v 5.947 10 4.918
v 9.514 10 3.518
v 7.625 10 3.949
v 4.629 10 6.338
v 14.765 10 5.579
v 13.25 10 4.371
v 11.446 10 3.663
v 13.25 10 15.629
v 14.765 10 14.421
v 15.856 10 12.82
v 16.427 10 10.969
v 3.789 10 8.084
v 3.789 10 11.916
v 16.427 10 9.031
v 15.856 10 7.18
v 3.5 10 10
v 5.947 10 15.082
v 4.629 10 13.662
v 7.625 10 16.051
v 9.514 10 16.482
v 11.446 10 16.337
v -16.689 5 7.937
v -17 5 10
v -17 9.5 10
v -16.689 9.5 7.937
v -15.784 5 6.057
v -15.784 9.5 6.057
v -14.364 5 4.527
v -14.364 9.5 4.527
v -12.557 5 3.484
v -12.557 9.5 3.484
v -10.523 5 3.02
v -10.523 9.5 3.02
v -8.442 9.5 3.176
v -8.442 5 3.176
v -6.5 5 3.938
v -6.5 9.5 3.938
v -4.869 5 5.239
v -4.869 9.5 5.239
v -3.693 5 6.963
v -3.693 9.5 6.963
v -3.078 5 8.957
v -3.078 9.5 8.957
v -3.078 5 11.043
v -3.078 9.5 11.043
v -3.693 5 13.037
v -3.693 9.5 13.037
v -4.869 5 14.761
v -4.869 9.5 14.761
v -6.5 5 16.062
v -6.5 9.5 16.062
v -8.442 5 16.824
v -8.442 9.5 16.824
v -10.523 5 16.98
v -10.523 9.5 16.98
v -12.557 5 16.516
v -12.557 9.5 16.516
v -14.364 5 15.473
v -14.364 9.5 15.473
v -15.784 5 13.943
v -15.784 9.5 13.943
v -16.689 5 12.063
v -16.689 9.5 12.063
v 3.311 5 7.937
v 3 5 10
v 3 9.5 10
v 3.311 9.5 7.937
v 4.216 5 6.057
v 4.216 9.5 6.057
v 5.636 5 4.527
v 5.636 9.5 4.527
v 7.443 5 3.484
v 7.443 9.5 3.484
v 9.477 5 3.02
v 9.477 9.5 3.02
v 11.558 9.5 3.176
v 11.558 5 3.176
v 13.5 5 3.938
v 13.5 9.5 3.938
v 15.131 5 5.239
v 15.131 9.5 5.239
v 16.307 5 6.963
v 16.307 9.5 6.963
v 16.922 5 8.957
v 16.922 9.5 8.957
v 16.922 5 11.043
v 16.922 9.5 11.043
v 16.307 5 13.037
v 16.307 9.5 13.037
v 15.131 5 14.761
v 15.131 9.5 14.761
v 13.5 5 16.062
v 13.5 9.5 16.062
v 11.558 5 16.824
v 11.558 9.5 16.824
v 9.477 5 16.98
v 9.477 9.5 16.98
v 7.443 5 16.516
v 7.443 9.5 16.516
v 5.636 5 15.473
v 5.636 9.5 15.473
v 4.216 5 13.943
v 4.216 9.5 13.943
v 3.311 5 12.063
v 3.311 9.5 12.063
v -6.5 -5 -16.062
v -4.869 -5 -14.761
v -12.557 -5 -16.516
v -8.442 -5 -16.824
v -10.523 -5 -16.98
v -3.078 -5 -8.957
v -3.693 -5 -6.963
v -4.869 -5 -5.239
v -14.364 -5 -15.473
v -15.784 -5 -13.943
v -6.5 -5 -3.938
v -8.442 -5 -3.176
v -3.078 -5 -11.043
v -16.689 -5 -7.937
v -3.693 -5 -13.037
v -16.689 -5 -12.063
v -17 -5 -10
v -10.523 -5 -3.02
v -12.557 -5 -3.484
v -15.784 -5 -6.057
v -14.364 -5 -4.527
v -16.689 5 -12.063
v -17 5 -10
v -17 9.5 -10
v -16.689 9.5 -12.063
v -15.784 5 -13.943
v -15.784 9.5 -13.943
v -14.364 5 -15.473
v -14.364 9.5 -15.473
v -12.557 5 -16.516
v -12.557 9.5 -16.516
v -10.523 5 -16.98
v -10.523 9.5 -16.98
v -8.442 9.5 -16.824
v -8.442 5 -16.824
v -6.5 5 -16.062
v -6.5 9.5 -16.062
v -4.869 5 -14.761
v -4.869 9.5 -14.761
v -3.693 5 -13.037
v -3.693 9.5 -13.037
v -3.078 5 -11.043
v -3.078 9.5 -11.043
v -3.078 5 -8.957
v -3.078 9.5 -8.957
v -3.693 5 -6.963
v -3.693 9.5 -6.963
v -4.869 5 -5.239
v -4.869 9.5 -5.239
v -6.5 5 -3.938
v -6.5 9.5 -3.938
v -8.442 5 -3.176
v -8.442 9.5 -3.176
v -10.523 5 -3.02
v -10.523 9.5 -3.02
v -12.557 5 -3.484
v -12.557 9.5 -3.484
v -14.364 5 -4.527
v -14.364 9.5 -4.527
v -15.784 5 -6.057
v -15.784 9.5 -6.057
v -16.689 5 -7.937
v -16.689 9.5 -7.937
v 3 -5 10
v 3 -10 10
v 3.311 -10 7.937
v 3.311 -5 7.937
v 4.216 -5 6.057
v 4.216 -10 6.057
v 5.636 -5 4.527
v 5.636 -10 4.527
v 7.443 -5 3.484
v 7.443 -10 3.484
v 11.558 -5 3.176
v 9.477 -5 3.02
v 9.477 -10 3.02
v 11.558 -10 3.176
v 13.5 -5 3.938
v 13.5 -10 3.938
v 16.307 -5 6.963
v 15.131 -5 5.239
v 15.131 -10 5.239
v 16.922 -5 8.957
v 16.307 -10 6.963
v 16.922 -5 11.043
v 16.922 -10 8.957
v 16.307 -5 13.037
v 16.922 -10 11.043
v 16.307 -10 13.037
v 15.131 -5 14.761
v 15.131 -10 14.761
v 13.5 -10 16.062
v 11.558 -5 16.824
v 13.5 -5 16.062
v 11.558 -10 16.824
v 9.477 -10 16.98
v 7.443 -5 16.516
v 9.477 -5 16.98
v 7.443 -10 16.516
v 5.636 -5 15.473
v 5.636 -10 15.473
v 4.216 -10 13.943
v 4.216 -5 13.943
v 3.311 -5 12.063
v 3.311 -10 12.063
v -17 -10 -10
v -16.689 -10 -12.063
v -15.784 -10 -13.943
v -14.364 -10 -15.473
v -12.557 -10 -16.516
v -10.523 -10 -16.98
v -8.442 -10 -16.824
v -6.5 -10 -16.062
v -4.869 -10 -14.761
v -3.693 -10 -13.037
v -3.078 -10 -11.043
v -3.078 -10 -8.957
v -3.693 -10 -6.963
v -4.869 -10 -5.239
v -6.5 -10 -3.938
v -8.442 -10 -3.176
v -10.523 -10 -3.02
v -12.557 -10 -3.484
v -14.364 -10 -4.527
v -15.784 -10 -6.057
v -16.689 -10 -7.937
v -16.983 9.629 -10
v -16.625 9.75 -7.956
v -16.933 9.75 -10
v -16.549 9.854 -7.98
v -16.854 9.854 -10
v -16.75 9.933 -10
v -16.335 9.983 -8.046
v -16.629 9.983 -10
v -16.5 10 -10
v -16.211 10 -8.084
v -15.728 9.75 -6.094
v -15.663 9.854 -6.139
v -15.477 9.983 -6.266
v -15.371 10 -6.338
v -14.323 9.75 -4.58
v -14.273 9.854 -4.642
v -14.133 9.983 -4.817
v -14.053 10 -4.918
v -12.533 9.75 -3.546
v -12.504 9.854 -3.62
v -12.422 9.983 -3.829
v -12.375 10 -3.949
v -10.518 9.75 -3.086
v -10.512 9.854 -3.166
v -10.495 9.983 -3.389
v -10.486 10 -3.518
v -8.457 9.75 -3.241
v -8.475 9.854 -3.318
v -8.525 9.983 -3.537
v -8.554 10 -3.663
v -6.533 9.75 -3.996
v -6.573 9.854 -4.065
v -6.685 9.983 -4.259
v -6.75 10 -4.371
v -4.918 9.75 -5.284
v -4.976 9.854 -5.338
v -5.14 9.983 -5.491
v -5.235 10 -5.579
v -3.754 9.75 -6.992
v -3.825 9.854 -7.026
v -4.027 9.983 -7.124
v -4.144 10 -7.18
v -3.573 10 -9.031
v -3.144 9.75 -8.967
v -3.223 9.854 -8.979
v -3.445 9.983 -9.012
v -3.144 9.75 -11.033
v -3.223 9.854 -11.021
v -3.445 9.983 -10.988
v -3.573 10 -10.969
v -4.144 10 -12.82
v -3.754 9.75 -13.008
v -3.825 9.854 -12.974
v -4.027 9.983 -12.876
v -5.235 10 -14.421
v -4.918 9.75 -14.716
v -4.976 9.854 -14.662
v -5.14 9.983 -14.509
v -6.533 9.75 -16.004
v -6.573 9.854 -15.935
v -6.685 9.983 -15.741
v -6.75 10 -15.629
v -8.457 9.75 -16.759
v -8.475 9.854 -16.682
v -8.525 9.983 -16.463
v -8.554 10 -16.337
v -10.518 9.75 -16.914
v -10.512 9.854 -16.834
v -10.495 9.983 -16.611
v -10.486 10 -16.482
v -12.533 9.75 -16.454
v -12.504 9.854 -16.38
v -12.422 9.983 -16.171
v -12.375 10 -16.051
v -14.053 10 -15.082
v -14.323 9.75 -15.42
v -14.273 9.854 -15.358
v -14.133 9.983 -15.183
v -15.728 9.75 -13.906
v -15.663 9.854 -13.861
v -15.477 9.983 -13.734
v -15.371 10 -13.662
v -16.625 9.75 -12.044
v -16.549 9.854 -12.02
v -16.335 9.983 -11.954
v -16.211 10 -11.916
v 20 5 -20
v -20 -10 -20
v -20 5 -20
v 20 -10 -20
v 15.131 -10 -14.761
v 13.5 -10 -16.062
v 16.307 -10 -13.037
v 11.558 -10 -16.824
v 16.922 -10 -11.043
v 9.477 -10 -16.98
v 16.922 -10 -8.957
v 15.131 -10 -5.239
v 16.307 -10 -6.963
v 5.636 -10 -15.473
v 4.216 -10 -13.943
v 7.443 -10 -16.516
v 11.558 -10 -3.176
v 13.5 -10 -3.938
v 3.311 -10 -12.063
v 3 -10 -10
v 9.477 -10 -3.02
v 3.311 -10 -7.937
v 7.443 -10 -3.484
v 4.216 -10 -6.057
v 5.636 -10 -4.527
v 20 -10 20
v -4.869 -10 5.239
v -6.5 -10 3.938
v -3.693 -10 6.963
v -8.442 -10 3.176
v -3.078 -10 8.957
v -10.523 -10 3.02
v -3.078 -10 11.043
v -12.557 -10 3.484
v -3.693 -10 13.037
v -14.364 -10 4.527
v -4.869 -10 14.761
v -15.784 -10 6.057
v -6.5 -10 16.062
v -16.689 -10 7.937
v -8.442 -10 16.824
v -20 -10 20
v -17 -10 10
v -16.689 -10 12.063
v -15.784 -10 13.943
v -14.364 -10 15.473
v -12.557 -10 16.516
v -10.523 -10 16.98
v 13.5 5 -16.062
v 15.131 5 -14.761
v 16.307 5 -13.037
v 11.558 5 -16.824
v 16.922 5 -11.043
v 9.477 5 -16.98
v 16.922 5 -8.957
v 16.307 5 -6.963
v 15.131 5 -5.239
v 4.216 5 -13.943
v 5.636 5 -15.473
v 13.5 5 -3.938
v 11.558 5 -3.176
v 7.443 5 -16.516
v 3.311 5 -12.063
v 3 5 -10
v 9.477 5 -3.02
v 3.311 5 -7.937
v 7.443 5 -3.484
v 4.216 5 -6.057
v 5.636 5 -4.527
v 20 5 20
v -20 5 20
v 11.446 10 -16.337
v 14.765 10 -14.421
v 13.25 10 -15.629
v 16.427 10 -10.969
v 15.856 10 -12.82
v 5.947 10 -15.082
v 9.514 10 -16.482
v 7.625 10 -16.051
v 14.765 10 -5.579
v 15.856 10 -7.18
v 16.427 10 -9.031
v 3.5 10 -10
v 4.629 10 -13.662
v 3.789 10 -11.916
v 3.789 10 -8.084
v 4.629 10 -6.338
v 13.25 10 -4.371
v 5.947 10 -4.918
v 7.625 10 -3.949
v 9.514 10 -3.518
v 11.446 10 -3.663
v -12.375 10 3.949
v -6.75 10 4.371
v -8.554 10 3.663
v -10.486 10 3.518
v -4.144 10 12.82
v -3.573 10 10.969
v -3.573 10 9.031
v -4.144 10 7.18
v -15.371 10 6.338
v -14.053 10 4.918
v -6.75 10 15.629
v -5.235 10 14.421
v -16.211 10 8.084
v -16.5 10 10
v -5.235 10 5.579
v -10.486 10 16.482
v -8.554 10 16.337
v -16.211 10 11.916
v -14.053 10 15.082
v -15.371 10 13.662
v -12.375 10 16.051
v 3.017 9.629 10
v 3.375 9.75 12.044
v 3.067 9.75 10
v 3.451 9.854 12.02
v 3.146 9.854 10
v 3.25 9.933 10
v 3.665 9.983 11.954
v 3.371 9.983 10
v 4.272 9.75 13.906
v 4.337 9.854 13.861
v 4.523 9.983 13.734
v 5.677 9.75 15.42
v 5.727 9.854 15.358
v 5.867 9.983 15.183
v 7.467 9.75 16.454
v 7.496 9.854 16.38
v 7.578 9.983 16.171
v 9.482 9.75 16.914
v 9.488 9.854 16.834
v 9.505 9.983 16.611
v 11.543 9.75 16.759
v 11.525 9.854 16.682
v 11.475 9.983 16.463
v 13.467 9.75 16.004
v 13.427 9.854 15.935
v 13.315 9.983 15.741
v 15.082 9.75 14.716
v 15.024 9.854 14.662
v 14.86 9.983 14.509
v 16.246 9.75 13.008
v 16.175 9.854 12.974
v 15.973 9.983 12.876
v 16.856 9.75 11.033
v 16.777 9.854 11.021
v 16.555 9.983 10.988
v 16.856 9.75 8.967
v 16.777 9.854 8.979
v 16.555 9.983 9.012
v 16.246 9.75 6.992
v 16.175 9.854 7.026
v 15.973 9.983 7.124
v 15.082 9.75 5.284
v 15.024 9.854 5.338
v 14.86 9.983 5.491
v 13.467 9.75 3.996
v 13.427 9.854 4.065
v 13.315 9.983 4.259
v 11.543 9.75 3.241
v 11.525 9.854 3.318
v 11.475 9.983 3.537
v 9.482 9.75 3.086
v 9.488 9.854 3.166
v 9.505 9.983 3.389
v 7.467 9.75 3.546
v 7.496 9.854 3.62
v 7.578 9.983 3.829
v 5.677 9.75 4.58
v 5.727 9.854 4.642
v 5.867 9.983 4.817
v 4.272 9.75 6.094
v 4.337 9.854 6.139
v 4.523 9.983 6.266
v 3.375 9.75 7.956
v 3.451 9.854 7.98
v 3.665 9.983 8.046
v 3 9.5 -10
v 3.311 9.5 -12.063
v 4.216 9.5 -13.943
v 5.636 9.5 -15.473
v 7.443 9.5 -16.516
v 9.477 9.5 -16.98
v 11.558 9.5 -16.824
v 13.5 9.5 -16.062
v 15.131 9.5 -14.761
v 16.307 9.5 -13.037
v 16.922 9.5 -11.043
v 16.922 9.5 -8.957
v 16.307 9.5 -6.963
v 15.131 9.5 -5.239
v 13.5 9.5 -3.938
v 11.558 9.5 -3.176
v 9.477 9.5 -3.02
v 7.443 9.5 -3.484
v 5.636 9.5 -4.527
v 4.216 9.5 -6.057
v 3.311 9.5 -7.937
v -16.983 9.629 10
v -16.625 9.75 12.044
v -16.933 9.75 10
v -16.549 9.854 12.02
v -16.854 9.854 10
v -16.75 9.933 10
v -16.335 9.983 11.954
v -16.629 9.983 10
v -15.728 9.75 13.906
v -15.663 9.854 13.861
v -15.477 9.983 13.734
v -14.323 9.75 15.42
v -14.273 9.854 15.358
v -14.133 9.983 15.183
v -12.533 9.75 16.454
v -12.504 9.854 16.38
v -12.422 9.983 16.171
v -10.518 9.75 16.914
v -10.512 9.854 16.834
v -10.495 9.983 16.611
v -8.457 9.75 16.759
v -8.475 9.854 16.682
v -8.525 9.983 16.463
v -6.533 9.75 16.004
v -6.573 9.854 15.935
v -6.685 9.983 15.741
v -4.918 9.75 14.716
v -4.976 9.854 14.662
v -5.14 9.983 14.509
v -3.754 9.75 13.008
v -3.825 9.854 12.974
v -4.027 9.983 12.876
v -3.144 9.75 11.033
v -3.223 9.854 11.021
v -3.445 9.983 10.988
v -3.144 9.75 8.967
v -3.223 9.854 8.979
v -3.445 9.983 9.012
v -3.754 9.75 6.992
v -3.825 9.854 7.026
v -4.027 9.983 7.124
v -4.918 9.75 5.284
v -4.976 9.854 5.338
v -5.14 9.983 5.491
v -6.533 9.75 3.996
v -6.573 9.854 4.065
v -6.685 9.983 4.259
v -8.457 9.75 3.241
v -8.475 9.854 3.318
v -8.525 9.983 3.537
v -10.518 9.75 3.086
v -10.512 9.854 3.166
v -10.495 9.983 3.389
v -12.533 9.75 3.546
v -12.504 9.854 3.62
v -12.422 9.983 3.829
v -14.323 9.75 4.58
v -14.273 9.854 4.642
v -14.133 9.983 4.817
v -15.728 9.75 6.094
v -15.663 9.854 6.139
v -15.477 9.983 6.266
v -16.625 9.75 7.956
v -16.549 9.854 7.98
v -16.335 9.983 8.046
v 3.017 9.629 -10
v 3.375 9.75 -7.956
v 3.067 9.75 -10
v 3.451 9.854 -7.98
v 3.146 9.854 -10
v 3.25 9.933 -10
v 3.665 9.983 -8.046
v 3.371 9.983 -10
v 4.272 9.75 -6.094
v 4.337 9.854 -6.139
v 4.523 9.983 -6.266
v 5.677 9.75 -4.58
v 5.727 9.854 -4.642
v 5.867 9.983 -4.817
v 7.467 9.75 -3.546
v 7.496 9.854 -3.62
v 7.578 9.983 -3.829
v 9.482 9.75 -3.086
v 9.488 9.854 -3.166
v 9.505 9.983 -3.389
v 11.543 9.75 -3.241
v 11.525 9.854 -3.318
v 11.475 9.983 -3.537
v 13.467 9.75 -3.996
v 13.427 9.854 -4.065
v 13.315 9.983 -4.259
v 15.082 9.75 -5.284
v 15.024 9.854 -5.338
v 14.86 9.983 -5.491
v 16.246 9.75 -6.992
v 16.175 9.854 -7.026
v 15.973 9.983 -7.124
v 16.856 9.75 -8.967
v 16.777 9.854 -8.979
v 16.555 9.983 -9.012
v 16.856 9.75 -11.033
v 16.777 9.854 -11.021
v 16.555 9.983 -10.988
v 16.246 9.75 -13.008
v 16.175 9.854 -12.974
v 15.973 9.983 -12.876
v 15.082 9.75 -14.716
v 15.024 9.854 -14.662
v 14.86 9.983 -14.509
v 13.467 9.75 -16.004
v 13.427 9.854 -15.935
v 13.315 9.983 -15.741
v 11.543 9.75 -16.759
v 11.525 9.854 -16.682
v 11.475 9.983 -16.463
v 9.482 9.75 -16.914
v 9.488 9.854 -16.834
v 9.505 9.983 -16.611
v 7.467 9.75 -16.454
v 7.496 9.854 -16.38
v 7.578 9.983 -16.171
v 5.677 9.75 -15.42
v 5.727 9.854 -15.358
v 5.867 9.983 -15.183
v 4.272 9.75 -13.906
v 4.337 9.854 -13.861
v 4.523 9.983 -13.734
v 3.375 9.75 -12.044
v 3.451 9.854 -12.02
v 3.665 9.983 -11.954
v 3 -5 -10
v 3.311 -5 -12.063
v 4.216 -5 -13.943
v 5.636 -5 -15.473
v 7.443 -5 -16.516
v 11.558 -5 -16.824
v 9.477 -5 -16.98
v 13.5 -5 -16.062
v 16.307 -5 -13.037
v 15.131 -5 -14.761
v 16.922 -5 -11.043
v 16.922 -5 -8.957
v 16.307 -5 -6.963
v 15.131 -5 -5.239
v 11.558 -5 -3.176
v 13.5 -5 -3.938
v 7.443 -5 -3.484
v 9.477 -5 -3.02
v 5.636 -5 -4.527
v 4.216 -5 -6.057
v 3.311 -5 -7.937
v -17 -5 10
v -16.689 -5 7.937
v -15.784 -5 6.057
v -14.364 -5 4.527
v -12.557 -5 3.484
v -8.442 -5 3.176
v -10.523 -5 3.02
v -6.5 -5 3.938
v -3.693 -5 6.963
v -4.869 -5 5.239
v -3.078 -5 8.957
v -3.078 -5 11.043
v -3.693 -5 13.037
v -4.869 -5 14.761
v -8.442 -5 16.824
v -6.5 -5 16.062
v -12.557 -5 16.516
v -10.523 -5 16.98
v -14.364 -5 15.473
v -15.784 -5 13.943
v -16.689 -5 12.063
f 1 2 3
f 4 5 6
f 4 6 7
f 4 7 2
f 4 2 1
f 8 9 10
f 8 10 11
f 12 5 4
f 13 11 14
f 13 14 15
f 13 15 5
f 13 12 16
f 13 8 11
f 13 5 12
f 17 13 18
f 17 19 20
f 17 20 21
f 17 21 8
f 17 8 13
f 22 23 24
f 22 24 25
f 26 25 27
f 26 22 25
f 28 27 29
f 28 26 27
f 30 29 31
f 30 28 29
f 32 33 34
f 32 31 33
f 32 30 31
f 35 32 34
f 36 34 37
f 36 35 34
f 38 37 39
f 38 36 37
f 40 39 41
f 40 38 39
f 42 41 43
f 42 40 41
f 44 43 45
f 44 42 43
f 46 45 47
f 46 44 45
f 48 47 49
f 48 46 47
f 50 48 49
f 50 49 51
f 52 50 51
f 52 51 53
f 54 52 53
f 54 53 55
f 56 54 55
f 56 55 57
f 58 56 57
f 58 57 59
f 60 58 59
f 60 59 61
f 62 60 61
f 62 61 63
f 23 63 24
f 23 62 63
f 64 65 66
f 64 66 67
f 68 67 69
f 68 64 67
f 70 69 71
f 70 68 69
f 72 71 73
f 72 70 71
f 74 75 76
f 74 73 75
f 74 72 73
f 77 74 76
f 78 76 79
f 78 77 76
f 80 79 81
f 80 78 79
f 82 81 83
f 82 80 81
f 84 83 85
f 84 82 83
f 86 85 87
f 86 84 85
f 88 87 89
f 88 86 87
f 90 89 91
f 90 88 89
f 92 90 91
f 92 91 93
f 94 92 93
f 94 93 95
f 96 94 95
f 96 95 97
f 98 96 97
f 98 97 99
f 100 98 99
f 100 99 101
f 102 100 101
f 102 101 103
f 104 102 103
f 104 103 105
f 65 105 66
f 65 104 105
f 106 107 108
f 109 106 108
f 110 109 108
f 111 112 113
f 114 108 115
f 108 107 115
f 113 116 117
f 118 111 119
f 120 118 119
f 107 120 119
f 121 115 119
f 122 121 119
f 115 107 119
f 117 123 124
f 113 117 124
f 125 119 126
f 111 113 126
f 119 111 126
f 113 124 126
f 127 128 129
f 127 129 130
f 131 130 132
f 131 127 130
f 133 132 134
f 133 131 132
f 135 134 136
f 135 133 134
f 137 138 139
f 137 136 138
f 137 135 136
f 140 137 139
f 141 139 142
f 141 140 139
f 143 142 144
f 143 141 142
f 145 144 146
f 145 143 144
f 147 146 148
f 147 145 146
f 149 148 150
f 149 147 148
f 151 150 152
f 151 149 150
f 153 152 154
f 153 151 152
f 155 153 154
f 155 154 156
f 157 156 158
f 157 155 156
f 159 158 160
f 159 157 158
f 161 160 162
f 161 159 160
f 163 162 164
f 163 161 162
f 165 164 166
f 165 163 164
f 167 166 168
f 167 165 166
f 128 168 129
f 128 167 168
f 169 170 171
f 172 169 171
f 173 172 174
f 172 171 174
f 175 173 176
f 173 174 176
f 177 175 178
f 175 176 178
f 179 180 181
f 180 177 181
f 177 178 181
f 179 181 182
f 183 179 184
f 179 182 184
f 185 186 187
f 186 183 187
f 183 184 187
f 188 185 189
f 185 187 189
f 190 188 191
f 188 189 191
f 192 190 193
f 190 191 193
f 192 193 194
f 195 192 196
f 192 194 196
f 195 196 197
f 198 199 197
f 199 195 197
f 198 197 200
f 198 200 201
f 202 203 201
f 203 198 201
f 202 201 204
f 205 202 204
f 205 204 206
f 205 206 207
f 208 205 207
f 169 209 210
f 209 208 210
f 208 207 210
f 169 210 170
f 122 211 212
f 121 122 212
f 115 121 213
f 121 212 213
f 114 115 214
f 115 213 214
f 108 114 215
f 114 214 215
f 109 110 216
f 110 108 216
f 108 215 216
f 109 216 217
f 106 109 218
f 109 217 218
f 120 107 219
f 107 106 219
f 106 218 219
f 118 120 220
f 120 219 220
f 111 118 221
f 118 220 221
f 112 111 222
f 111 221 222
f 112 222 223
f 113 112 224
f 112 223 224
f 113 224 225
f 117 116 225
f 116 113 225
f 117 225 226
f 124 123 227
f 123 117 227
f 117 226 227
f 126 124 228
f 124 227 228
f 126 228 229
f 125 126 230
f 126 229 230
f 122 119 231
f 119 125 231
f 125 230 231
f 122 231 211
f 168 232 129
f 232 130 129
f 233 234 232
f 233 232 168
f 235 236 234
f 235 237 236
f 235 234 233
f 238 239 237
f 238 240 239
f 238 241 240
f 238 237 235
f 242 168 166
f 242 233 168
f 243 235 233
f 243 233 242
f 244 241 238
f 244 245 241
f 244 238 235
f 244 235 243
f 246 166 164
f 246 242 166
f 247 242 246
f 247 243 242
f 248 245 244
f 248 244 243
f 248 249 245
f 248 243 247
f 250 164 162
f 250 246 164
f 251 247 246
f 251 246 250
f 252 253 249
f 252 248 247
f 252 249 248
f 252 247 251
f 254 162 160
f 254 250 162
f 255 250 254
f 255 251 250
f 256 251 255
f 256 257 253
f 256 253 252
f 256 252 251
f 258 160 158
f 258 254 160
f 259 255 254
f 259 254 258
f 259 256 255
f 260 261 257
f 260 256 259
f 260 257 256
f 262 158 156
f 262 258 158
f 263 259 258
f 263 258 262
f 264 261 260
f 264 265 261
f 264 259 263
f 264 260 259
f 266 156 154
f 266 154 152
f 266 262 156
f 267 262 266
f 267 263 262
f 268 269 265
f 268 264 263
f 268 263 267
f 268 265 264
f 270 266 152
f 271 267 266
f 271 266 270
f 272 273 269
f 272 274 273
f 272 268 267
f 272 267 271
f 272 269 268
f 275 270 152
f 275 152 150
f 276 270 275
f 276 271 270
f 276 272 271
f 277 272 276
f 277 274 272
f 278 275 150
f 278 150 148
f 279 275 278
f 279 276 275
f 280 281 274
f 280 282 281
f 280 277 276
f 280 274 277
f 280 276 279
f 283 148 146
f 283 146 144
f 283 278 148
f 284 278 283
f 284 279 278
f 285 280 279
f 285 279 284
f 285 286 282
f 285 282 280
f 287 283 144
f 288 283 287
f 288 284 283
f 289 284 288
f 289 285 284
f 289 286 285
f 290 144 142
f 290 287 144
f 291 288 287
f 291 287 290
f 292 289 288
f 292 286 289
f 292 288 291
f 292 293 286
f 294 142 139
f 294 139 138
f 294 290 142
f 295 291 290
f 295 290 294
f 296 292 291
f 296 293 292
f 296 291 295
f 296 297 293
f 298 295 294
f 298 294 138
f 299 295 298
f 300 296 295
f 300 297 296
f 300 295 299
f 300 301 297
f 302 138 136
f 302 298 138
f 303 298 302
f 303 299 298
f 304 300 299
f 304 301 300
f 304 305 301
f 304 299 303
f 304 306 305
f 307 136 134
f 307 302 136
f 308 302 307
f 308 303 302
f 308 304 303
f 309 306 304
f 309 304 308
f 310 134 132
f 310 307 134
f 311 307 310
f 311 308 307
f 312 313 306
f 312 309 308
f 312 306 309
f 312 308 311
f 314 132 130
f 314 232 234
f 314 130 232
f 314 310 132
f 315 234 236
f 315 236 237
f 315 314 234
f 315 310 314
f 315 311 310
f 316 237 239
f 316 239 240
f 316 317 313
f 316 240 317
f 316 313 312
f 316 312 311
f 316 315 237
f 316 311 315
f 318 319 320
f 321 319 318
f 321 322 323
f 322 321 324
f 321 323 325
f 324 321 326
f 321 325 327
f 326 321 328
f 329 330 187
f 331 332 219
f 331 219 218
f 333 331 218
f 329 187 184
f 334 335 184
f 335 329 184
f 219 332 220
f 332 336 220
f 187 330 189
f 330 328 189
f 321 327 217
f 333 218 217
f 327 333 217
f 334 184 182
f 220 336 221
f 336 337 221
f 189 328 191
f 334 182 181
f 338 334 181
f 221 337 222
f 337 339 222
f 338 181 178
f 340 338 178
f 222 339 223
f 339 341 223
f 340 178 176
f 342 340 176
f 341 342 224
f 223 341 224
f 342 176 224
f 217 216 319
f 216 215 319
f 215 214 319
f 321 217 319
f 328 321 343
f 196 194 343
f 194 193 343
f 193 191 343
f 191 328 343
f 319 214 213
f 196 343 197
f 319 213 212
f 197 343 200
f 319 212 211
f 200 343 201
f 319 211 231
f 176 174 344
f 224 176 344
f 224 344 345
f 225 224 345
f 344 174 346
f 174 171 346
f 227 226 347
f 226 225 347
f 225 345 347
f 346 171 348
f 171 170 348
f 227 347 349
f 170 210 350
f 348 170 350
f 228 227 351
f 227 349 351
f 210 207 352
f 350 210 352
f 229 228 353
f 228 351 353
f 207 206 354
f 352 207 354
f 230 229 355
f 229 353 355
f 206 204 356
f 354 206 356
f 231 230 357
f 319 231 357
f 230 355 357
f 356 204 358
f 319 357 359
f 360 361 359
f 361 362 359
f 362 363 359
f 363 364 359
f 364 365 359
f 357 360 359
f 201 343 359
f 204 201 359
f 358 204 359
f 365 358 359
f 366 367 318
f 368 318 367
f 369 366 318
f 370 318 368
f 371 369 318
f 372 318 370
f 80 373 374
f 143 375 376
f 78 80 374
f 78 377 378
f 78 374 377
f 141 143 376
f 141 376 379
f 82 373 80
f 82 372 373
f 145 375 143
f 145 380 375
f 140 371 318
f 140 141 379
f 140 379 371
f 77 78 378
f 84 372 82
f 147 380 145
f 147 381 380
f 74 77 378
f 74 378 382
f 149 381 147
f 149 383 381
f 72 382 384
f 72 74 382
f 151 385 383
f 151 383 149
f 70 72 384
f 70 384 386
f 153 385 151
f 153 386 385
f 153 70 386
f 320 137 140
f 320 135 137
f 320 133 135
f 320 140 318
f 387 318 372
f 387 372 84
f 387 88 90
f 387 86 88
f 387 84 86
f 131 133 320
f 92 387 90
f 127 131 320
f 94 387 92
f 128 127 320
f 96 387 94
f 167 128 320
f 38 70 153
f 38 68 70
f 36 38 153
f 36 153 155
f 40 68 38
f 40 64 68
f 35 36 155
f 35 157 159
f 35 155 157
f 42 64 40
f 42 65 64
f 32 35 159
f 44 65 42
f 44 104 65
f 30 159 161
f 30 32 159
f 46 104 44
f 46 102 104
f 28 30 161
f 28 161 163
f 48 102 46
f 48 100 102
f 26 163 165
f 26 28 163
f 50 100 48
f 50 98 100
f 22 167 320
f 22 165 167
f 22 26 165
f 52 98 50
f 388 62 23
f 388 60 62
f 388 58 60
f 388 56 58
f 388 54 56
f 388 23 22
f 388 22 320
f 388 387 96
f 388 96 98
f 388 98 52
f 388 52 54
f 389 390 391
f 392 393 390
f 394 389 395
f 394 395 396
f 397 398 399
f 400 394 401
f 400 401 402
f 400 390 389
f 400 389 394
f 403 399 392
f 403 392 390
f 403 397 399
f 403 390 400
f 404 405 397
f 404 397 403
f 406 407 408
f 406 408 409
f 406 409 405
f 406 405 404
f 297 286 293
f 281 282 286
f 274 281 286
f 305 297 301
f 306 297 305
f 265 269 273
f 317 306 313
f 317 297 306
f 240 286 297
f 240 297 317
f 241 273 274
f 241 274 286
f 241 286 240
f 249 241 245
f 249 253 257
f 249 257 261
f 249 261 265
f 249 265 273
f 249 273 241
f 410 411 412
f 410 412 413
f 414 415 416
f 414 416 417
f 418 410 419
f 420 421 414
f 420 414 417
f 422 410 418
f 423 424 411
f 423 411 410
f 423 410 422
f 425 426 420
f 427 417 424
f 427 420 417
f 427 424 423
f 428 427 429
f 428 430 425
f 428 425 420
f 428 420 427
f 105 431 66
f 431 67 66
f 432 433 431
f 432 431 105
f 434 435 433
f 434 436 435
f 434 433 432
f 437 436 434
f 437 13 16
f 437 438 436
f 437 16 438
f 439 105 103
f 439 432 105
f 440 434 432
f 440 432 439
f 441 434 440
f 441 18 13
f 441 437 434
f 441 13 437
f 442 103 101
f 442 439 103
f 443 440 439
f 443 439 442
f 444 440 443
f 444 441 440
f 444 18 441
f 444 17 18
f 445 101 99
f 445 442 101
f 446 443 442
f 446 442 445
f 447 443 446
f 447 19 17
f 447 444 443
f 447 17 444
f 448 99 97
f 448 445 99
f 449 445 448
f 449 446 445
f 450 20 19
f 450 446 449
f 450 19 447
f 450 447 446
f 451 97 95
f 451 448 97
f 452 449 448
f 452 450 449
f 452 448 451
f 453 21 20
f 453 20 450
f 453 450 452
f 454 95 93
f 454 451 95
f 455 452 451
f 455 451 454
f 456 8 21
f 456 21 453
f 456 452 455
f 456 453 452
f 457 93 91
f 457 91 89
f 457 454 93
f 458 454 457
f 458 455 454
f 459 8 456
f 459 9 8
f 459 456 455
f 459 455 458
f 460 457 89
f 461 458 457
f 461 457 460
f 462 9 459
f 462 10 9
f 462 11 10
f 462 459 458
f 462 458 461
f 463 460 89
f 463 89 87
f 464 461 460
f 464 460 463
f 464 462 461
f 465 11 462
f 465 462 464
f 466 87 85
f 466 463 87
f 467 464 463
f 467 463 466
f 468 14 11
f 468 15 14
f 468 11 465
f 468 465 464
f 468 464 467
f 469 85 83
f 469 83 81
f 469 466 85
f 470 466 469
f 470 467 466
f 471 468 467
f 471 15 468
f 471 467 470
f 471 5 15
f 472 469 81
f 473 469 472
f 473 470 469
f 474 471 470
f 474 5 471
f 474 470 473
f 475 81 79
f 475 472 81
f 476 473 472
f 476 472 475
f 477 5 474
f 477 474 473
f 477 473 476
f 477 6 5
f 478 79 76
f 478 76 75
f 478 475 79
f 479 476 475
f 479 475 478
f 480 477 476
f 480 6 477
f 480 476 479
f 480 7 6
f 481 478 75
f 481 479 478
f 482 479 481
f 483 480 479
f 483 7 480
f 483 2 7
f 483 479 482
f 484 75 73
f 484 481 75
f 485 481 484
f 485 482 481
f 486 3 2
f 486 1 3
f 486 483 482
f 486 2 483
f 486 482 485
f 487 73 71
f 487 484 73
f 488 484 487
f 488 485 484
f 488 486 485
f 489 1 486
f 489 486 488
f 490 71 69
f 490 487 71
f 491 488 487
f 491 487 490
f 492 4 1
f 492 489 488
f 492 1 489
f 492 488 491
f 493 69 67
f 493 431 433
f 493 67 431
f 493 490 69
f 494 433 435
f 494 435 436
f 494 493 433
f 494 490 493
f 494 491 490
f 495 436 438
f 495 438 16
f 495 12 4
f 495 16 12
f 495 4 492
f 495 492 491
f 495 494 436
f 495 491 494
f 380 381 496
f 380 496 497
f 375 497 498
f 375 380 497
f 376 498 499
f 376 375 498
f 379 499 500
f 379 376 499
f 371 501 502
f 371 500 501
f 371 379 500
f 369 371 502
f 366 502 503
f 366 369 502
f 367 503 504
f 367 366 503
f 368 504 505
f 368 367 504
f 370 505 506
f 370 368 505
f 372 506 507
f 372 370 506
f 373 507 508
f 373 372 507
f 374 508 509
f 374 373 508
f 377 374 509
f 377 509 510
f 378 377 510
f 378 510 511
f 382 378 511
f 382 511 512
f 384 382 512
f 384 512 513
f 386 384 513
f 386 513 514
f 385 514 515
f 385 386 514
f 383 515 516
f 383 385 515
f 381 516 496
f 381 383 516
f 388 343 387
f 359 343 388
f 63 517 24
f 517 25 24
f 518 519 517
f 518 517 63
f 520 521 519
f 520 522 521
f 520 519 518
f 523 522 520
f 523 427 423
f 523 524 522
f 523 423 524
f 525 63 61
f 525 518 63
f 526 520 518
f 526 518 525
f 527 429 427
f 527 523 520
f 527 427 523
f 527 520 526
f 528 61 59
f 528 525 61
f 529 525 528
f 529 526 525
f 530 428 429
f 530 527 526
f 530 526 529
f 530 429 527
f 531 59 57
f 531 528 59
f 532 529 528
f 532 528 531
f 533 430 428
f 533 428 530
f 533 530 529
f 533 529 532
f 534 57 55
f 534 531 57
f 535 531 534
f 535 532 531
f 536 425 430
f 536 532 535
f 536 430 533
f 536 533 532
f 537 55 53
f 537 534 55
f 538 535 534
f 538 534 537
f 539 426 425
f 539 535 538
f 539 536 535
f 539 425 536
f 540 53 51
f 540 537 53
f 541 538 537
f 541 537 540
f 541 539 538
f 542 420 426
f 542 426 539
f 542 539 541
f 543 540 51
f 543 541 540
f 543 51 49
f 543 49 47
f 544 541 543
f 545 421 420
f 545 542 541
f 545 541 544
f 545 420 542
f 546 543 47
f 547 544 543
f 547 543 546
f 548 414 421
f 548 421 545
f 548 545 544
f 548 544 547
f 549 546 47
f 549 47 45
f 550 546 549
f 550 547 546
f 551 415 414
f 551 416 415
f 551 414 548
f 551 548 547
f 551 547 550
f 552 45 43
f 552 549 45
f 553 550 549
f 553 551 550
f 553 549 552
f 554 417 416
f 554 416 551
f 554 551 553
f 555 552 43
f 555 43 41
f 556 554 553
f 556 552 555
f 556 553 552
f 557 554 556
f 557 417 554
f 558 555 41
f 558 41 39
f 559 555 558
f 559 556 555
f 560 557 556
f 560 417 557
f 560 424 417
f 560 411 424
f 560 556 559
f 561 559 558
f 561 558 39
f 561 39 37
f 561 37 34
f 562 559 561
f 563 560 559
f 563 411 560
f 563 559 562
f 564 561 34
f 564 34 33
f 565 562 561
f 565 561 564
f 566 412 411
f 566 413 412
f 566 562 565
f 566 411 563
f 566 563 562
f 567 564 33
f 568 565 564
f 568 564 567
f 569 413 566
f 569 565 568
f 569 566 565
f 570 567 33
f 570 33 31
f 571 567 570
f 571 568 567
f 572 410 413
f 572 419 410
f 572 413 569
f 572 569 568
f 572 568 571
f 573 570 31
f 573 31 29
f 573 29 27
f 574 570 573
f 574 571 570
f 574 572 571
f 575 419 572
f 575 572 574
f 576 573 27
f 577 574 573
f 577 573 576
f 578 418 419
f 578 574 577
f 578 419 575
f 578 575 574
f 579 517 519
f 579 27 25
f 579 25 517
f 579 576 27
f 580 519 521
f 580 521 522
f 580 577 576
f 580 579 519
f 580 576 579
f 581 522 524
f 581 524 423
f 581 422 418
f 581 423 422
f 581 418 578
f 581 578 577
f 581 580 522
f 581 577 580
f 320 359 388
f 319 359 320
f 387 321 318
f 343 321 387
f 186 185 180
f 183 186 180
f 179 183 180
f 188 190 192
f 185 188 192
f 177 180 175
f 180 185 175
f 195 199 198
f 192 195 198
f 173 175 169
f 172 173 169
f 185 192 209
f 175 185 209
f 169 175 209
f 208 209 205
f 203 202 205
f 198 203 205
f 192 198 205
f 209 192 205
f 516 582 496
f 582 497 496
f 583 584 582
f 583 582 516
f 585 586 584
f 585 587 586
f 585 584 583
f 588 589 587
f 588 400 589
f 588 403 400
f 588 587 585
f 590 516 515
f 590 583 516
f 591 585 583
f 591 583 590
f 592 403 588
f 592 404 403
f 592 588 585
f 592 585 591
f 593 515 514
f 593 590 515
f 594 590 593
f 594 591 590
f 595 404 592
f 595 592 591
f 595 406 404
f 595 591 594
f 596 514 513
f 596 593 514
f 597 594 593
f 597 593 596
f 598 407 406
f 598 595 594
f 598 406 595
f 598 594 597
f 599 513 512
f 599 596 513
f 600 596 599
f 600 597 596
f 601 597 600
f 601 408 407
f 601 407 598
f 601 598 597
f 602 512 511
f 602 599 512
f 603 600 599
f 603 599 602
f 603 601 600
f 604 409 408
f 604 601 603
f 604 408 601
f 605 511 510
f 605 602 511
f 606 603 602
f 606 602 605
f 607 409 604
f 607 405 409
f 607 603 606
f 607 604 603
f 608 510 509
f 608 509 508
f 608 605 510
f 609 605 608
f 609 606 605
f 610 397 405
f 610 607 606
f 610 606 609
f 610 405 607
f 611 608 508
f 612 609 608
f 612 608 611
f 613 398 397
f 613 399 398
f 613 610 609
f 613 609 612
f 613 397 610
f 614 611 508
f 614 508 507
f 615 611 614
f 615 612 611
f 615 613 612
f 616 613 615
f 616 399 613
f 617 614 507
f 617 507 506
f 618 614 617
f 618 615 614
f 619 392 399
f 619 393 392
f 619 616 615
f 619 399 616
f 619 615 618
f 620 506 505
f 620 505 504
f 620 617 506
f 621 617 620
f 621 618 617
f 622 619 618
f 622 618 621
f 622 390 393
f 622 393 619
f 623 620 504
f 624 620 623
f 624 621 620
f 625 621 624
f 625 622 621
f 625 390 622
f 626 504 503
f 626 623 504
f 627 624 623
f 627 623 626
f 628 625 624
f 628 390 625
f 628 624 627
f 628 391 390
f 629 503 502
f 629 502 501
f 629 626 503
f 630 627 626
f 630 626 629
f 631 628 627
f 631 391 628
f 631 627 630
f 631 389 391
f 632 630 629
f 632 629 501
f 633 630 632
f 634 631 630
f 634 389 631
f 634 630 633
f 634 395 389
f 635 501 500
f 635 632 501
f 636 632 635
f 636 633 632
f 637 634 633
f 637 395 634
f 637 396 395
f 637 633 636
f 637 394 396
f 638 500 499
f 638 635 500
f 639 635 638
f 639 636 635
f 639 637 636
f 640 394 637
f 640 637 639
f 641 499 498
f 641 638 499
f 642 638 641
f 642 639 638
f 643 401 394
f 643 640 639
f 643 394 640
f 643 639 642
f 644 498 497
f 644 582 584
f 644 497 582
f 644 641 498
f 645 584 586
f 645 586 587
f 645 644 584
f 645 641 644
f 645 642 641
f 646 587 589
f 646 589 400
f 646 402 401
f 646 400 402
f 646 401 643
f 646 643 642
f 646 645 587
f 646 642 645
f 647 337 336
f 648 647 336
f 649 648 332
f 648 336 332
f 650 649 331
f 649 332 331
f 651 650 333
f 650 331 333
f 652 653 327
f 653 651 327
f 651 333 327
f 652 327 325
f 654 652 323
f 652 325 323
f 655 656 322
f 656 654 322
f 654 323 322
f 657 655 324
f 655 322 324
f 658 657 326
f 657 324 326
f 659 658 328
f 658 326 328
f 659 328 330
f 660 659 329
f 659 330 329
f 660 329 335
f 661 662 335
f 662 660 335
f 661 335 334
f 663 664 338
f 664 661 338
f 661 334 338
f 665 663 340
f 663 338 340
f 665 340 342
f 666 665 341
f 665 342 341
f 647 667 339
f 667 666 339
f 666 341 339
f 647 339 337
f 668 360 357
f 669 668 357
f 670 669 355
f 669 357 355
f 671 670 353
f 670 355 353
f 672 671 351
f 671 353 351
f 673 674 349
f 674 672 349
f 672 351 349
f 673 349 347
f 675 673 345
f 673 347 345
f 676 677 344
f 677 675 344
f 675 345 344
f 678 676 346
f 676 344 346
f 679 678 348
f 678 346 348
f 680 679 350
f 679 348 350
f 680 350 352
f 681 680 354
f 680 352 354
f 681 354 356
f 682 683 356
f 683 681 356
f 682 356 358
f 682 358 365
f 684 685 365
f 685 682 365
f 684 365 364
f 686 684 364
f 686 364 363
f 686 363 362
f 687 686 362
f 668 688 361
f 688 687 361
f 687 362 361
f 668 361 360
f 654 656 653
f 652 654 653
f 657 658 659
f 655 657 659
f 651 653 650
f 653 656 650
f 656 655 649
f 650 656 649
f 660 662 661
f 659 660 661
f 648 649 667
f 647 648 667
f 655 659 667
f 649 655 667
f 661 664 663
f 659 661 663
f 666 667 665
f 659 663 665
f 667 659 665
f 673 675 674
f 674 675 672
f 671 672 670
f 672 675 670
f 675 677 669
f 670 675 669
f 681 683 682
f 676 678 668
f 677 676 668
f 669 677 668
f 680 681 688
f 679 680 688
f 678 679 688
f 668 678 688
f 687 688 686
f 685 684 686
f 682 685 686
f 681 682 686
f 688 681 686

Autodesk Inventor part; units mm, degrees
ref_plane "YZ Plane" through (0, 0, 0) normal (1, 0, 0) x (0, 1, 0)
ref_plane "XZ Plane" through (0, 0, 0) normal (0, 1, 0) x (-1, 0, 0)
ref_plane "XY Plane" through (0, 0, 0) normal (0, 0, 1) x (1, 0, 0)
sketch "Sketch2" plane through (0, 0, 0) normal (0, 1, 0) x (-1, 0, 0)
  line L0 (-20, 20) -> (20, 20)
  line L1 (20, 20) -> (20, -20)
  line L2 (20, -20) -> (-20, -20)
  line L3 (-20, -20) -> (-20, 20)
  circle A0 centre (10, 10) radius 7
  circle A1 centre (10, -10) radius 7
  circle A2 centre (-10, -10) radius 7
  circle A3 centre (-10, 10) radius 7
  point P0 (0, 0)
extrude "Extrusion1" add sketch "Sketch2" along normal blind 5 and the other way blind 10
extrude "Extrusion2" add sketch "Sketch2" along normal blind 10 and the other way blind 5 contours A0 | A1 | A2 | A3
fillet "Fillet1" radius 0.5 4 edges at (-3, 10, 10) (-3, 10, -10) (17, 10, -10) (17, 10, 10)
properties part number "Tercer examen. Cubo LEGO. Villegas"
